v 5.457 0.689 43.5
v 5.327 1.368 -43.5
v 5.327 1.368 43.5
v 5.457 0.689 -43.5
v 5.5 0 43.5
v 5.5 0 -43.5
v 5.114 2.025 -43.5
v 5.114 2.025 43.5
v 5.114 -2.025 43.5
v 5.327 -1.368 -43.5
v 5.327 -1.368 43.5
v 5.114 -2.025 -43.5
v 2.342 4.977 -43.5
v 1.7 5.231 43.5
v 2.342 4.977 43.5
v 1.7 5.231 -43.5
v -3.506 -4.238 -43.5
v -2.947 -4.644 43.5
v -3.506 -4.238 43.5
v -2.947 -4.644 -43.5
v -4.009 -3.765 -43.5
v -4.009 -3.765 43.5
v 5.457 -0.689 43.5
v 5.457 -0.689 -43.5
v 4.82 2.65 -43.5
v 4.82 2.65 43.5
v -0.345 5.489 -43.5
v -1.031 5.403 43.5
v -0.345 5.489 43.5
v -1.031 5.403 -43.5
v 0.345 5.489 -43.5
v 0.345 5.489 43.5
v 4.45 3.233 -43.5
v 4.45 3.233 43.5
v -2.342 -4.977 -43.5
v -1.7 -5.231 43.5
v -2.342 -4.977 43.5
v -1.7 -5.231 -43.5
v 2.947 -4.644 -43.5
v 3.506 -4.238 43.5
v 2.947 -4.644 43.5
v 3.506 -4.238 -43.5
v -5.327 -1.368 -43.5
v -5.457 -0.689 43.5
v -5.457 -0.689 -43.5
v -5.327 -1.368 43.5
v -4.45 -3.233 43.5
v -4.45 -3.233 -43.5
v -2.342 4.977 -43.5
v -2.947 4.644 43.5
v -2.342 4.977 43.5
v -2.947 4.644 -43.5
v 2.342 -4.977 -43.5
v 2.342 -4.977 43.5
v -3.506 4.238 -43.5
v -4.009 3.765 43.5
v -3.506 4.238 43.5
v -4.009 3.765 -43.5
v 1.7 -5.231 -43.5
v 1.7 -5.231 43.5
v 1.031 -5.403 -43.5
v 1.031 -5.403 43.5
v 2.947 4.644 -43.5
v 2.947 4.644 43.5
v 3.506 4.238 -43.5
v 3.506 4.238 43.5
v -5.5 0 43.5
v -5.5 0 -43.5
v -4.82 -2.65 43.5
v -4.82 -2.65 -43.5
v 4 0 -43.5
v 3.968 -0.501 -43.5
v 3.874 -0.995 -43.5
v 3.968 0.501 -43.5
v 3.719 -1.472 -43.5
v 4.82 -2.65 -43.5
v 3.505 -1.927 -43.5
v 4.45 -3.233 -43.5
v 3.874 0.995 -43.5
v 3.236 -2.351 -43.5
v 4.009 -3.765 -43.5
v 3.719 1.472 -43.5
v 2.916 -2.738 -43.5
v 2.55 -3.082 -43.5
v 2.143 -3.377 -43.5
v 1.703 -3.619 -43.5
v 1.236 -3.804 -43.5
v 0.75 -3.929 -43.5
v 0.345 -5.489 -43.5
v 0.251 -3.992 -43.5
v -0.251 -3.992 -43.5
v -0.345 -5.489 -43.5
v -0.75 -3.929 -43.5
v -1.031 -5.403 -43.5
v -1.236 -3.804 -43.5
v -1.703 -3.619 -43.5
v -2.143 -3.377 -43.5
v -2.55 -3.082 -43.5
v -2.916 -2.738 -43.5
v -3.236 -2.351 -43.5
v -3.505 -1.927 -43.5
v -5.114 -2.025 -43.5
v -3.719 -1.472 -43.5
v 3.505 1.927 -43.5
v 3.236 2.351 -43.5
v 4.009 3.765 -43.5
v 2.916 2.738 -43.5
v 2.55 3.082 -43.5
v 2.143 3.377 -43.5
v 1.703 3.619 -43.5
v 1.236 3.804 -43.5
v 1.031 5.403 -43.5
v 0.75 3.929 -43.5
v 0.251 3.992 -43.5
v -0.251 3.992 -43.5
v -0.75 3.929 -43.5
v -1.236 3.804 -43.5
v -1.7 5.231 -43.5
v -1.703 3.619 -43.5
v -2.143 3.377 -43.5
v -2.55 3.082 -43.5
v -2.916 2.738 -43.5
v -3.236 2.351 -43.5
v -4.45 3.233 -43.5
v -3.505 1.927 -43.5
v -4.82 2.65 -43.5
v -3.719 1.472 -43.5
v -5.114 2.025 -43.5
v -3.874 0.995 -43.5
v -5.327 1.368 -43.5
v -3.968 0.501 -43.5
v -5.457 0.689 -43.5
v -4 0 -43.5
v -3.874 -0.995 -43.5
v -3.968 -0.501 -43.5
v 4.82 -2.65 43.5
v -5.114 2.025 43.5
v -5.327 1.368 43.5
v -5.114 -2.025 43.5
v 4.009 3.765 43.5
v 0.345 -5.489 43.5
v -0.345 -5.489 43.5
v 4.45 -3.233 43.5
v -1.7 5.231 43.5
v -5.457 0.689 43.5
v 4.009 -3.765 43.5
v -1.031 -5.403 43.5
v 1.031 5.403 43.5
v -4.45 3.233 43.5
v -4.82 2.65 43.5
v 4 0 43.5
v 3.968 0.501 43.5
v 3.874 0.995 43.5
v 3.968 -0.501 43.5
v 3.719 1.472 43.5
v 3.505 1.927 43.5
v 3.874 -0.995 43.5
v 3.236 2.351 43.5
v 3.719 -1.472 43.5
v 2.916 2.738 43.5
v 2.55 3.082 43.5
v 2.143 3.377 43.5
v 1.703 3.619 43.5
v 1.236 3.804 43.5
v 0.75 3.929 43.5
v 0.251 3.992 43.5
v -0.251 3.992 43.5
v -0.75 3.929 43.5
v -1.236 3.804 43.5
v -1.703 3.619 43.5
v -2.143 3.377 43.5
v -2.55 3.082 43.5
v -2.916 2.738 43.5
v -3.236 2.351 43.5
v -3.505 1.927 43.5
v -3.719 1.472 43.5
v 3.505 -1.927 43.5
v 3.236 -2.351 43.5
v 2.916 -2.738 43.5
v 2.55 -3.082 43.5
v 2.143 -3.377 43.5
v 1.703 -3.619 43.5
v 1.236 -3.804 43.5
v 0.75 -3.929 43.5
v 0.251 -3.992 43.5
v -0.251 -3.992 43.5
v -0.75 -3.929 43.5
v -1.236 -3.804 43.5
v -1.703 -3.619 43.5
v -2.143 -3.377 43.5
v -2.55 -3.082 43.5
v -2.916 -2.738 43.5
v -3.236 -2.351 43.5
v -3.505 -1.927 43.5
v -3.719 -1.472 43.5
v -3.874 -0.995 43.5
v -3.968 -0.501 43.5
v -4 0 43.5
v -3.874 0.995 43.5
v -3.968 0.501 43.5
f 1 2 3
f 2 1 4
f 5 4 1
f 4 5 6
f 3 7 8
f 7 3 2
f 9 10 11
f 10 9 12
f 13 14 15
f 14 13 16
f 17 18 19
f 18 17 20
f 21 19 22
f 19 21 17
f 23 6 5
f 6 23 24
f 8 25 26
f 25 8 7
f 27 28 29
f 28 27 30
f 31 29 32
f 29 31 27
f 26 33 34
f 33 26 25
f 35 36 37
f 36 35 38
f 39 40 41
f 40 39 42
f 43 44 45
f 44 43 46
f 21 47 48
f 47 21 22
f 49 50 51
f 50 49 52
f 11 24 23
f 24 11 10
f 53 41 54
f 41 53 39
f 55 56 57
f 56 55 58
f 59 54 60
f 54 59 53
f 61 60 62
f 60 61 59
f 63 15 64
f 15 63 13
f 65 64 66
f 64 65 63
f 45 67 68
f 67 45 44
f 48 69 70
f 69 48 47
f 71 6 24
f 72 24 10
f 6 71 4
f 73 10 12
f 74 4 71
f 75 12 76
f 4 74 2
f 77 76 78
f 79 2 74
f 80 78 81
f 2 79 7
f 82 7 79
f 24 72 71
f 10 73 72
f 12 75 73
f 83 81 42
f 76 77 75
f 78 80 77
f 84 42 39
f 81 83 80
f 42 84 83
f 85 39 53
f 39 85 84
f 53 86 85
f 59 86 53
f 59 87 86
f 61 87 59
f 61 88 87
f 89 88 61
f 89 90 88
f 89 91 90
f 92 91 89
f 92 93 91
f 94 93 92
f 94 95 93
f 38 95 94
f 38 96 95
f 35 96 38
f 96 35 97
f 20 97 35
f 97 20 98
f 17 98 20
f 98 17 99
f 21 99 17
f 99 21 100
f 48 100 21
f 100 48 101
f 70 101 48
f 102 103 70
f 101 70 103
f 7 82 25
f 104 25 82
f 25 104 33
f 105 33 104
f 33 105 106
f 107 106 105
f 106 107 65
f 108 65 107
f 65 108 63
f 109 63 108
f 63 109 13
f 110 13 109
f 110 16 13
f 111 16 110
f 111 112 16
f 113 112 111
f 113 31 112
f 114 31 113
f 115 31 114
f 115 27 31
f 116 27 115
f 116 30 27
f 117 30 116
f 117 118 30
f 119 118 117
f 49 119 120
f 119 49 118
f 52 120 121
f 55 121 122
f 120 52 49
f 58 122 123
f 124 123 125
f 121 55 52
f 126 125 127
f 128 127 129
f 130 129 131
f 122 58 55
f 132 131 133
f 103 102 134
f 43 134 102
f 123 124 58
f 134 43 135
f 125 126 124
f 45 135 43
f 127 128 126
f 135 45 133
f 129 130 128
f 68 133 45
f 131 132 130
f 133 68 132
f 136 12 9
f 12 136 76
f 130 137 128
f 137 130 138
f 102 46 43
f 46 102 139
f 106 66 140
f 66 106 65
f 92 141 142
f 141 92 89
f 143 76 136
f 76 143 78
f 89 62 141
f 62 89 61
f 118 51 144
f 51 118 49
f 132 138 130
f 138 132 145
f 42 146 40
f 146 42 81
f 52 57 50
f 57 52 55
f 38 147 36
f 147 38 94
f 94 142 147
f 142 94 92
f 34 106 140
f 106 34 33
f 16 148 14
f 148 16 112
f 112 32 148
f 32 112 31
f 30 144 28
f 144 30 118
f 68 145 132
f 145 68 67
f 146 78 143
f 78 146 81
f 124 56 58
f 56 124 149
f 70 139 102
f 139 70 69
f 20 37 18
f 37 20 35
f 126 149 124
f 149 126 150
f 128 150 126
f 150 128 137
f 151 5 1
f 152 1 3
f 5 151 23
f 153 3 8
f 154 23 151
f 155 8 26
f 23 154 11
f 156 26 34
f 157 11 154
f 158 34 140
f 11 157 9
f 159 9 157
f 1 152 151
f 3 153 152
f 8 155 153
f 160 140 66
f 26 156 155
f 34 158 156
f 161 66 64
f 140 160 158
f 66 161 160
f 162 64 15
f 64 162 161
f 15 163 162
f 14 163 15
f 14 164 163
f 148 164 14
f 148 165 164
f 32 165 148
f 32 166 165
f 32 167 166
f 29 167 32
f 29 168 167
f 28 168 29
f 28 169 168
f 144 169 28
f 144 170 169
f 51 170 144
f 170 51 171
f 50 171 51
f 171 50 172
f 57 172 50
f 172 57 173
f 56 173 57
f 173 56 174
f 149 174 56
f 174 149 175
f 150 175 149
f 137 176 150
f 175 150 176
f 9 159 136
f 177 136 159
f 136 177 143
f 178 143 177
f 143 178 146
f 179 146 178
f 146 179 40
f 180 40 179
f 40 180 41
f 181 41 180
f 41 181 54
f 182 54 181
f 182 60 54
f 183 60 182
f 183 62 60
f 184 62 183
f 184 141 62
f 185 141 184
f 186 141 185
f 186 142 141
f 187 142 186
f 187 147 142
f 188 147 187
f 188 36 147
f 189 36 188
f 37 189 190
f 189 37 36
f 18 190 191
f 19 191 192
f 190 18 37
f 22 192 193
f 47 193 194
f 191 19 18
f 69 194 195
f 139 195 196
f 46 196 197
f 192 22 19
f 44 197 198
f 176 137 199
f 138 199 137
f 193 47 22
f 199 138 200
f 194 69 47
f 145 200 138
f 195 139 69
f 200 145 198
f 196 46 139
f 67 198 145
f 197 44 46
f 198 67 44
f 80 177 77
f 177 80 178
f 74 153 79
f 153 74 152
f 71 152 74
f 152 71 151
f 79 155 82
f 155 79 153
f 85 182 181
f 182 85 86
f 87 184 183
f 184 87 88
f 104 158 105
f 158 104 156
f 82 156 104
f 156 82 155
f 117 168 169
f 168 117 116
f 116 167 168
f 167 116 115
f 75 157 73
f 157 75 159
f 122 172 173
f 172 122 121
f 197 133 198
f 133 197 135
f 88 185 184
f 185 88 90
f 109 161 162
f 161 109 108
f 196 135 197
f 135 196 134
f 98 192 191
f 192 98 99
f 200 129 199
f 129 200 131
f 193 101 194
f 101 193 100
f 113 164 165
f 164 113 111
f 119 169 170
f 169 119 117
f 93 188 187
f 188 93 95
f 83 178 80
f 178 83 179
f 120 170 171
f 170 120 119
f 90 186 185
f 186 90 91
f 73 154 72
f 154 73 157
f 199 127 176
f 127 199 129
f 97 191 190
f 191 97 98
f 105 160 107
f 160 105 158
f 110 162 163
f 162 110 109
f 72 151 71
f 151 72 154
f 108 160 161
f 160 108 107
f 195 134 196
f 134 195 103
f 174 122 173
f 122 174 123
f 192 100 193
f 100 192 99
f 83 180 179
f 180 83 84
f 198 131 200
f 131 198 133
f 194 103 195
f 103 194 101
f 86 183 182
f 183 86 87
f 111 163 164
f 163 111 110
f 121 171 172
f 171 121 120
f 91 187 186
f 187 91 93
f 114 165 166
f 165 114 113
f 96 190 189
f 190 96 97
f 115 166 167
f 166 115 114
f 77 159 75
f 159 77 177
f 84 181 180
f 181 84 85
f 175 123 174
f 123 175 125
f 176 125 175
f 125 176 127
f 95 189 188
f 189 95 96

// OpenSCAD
$fn = 50;


difference() {
	union() {
		translate(v = [0, 0, -43.5000000000]) {
			cylinder(h = 87, r = 5.5000000000);
		}
	}
	union() {
		translate(v = [0, 0, -100.0000000000]) {
			cylinder(h = 200, r = 4.0000000000);
		}
	}
}
